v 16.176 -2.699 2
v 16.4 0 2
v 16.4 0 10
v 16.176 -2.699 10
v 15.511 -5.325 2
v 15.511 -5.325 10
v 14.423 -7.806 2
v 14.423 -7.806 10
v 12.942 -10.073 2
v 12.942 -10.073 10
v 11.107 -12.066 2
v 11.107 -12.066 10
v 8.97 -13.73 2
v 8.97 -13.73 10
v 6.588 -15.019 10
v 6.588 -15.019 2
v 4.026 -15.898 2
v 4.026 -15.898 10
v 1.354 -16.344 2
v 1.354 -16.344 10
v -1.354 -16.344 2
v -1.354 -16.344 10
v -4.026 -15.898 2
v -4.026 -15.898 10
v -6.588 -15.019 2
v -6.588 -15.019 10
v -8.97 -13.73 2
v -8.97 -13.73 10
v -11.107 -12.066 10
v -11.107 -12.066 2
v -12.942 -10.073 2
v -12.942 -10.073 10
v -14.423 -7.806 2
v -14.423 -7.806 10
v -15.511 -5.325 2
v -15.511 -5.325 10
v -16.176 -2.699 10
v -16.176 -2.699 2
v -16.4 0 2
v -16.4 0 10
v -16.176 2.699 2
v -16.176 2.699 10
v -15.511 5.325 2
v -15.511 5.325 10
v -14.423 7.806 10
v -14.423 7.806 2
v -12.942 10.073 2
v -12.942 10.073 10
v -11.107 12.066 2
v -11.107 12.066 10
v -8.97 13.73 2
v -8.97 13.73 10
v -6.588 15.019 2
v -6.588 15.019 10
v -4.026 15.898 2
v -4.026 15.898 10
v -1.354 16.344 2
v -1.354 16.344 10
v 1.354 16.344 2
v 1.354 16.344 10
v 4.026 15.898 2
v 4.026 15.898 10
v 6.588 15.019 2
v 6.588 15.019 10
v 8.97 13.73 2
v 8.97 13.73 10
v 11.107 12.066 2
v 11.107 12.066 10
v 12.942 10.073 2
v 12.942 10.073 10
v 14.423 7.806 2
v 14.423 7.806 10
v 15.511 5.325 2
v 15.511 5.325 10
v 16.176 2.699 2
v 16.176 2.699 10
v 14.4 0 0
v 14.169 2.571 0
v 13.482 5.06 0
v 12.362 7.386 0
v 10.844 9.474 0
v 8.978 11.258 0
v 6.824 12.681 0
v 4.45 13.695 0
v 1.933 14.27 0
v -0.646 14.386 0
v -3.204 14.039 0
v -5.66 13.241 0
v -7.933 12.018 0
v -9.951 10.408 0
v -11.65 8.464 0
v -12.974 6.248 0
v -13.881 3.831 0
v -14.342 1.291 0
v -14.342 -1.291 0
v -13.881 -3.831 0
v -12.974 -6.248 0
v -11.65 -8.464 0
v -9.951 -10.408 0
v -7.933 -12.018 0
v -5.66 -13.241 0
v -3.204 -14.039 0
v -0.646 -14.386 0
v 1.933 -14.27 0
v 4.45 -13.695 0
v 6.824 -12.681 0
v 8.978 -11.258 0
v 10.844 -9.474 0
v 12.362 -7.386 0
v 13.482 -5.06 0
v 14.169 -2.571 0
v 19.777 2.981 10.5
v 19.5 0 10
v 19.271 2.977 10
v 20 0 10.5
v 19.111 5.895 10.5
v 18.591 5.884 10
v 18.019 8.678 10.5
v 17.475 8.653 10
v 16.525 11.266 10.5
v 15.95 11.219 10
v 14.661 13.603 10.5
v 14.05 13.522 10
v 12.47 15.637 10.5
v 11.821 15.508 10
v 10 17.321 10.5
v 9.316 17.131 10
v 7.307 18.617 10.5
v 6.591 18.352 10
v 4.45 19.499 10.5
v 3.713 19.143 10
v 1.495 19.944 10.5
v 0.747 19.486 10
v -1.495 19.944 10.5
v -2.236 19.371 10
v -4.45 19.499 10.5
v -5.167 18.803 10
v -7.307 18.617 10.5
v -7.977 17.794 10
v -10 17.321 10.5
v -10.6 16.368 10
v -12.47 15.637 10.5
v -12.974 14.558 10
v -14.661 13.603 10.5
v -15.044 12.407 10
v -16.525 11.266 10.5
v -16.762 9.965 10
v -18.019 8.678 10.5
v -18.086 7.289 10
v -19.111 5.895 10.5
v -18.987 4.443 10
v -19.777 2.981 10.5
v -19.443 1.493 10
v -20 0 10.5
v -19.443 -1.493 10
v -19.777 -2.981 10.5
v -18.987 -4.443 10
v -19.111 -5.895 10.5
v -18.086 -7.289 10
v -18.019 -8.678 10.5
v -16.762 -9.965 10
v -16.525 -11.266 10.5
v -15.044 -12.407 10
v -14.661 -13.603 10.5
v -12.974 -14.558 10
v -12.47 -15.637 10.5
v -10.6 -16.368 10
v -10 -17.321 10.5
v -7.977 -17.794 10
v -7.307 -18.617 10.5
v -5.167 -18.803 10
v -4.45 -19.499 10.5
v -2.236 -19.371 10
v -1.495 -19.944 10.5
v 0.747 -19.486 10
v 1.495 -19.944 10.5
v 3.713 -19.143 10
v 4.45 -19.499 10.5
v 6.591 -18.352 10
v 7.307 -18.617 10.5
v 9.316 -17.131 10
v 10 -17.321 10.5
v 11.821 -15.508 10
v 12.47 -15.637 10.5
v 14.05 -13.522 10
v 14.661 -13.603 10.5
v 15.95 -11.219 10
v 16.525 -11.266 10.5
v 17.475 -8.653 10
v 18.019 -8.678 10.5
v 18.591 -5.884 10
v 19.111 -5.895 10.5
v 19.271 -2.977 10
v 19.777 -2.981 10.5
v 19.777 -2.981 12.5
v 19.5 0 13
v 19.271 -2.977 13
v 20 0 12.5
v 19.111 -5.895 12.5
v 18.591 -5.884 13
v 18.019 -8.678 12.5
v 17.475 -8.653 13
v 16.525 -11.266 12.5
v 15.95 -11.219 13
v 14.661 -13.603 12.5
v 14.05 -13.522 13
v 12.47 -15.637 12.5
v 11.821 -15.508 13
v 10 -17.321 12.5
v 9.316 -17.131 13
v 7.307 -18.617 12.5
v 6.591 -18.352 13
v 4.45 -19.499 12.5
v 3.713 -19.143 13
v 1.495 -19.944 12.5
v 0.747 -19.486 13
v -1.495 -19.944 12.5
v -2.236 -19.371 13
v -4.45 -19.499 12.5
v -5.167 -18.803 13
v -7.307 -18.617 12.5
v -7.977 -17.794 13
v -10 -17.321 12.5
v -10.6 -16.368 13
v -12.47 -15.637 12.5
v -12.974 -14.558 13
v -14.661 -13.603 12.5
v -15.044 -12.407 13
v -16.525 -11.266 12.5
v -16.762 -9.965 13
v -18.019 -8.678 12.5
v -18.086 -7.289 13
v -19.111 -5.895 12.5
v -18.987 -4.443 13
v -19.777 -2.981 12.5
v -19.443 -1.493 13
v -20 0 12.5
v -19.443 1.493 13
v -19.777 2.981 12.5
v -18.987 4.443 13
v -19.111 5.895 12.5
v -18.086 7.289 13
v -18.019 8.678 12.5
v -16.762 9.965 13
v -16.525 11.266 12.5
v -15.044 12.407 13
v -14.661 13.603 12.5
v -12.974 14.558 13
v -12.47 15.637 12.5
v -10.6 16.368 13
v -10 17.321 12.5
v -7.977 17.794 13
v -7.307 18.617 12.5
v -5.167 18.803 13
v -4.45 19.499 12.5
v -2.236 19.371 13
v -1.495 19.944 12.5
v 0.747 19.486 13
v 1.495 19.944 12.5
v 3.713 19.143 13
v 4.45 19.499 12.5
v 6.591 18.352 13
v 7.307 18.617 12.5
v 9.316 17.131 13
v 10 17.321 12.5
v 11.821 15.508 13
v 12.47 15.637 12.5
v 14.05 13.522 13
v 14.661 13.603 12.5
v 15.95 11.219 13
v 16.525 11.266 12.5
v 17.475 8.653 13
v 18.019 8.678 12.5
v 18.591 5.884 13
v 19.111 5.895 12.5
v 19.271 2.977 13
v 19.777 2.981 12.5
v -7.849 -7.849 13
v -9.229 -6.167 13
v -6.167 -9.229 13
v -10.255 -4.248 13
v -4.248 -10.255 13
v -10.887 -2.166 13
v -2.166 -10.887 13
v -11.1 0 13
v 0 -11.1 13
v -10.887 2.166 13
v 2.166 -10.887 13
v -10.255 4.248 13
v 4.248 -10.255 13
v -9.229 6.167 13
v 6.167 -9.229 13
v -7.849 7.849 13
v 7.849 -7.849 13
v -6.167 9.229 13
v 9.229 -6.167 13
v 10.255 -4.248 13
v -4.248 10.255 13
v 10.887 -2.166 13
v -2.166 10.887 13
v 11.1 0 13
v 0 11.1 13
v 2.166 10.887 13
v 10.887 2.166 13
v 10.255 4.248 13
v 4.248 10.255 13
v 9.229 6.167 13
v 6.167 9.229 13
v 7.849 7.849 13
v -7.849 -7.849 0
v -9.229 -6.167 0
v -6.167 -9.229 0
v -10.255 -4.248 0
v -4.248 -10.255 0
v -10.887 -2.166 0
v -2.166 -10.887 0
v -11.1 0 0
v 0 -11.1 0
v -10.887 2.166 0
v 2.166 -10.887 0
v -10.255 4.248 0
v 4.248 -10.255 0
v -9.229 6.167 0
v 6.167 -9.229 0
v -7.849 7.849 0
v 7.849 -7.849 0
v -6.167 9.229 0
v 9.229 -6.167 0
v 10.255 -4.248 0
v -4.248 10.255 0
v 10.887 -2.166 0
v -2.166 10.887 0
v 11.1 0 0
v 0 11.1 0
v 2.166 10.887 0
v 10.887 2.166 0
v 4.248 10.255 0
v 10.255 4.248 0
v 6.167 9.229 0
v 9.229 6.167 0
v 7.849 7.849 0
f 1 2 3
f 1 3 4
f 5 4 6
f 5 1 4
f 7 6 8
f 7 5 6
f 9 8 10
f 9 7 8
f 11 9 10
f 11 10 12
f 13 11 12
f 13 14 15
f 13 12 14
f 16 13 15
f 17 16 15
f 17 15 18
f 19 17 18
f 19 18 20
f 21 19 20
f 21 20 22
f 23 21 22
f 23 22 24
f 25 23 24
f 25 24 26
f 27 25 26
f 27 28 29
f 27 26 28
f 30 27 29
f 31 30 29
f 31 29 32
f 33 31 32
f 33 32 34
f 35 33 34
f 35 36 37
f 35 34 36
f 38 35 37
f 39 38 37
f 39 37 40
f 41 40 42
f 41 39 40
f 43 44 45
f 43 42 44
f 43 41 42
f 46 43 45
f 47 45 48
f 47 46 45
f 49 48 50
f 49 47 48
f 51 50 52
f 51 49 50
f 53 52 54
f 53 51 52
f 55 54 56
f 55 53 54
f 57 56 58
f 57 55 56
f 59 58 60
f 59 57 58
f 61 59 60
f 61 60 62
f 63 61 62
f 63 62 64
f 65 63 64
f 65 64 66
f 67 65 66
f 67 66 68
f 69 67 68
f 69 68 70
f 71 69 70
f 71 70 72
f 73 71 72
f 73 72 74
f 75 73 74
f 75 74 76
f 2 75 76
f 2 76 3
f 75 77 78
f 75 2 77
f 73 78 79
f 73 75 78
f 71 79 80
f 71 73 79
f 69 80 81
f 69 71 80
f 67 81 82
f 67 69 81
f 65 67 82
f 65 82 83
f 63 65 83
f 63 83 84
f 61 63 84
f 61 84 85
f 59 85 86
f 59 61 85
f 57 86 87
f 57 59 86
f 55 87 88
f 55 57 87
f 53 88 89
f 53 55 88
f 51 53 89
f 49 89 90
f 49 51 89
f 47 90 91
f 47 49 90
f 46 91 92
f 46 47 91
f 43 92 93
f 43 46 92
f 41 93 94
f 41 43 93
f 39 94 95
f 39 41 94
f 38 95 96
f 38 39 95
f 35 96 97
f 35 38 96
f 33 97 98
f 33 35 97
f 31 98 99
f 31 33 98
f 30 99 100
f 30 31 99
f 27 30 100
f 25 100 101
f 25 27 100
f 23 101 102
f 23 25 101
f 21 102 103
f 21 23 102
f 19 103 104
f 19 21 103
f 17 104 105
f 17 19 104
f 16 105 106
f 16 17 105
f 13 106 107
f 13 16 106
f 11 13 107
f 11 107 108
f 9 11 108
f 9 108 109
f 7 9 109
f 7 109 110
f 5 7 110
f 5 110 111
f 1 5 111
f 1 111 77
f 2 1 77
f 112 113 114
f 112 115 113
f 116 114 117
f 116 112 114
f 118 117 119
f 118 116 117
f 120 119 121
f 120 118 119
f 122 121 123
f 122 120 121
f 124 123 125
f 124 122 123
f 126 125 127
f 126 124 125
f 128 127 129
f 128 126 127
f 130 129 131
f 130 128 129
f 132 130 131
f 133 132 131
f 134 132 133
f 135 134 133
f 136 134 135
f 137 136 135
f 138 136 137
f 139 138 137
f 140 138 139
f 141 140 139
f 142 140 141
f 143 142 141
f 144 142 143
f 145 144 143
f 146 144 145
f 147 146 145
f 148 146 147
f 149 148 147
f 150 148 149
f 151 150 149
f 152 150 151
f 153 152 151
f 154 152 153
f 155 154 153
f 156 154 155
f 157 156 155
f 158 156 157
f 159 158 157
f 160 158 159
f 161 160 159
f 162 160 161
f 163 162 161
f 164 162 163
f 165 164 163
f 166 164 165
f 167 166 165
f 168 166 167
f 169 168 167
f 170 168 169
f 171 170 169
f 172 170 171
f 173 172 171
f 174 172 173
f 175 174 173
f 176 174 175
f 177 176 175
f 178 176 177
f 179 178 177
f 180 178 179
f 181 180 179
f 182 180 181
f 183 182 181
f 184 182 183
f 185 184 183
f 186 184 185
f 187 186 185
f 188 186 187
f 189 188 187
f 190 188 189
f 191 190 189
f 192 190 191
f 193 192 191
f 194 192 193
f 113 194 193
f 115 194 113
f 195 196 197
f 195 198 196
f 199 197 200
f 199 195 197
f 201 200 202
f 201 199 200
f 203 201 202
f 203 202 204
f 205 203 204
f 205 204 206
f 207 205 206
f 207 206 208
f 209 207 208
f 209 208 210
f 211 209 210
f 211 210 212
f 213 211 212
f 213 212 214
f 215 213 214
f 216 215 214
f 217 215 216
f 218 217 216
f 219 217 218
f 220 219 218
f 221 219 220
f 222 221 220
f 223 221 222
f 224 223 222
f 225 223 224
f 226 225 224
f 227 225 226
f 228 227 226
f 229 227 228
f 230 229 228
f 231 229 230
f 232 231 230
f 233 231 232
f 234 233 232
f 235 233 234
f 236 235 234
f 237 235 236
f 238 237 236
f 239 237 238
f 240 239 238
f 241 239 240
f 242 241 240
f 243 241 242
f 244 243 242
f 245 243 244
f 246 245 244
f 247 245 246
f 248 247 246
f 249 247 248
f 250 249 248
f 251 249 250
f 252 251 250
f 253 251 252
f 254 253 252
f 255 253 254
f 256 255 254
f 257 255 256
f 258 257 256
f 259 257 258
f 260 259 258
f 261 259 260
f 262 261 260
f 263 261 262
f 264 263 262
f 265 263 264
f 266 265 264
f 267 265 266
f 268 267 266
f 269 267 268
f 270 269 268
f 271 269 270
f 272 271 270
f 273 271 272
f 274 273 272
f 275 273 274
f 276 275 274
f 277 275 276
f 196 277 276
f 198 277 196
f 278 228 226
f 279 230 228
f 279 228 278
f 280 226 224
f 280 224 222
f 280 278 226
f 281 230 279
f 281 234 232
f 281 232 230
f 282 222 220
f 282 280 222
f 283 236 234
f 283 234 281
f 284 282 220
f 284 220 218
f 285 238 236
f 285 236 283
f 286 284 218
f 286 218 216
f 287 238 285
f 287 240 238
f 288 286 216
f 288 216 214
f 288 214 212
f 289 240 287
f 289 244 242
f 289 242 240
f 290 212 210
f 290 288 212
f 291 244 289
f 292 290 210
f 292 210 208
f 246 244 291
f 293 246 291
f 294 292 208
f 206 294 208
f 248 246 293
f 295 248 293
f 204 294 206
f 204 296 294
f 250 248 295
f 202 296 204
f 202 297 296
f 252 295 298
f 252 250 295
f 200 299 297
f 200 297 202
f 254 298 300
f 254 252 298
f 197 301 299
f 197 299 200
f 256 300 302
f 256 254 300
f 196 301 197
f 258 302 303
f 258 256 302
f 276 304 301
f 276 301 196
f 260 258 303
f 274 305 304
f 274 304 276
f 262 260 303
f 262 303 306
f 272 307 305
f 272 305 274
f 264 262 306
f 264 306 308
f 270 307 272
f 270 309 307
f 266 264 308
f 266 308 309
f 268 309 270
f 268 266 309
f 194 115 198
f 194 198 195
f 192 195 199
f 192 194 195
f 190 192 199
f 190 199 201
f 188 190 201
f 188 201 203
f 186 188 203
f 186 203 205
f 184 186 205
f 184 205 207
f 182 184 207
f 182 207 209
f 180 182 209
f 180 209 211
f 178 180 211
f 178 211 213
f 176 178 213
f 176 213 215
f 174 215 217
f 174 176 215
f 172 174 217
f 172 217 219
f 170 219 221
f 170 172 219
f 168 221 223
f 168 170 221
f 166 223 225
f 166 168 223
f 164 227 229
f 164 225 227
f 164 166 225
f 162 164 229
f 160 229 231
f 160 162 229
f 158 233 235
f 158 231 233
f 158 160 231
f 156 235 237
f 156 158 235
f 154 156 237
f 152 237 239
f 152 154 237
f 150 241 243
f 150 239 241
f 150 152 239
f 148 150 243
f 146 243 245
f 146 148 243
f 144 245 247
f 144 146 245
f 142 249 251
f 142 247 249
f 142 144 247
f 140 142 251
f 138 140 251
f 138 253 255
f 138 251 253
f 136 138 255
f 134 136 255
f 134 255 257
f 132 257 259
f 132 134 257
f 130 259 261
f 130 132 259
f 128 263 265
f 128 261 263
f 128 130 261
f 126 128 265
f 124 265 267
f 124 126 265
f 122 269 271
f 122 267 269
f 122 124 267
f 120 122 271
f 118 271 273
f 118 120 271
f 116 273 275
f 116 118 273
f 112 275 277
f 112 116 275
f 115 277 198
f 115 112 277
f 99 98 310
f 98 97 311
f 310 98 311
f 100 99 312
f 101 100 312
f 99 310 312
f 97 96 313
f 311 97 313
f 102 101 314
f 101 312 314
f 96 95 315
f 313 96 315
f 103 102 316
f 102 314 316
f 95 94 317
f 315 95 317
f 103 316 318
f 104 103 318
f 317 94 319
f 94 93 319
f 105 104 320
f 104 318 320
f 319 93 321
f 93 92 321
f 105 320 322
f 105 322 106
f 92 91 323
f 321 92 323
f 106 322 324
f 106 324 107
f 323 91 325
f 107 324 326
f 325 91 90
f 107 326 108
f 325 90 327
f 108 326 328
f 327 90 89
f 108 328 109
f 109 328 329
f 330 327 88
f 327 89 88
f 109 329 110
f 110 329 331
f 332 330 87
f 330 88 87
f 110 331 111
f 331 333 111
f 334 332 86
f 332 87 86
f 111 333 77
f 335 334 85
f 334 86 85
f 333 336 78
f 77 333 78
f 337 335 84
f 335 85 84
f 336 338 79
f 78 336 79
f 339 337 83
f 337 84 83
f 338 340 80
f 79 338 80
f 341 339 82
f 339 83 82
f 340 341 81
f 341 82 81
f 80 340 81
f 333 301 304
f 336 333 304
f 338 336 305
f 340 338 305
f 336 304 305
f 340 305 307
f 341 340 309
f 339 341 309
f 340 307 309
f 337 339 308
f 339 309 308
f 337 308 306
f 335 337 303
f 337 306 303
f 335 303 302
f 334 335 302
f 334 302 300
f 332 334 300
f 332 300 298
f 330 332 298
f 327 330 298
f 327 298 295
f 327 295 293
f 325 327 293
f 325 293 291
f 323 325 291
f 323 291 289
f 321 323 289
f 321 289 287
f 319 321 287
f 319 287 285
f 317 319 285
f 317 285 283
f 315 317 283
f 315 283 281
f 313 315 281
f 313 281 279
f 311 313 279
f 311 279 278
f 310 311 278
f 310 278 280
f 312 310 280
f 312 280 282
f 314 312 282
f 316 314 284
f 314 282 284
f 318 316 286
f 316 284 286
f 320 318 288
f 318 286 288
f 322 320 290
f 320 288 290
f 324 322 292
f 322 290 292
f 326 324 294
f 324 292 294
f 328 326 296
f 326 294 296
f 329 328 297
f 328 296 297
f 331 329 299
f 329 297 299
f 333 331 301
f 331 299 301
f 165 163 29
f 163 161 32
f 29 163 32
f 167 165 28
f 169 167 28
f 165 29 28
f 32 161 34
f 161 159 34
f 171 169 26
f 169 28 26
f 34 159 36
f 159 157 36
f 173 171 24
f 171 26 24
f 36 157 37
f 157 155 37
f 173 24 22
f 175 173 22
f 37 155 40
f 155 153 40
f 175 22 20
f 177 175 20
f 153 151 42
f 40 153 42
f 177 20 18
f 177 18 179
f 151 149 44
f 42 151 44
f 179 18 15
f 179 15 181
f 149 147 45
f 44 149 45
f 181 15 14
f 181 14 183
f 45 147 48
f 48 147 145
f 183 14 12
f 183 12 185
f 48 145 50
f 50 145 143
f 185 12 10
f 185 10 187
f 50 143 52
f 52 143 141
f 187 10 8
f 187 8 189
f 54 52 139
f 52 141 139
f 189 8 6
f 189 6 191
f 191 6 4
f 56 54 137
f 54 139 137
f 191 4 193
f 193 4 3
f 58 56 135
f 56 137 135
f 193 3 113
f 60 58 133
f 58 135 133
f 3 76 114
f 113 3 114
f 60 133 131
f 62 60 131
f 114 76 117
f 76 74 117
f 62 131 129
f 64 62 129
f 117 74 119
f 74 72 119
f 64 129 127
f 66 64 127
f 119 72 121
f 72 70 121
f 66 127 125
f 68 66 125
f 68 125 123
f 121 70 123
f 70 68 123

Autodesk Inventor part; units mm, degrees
ref_plane "YZ Plane" through (0, 0, 0) normal (1, 0, 0) x (0, 1, 0)
ref_plane "XZ Plane" through (0, 0, 0) normal (0, 1, 0) x (-1, 0, 0)
ref_plane "XY Plane" through (0, 0, 0) normal (0, 0, 1) x (1, 0, 0)
sketch "スケッチ1" plane through (0, 0, 0) normal (0, 0, 1) x (1, 0, 0)
  circle A0 centre (0, 0) radius 16.4
  dimension "d0" = 32.8
extrude "押し出し1" add sketch "スケッチ1" along normal blind 10
sketch "スケッチ2" plane through (0, 0, 10) normal (0, 0, 1) x (1, 0, 0)
  circle A0 centre (0, 0) radius 16.4 projected
  circle A1 centre (0, 0) radius 20
  dimension "d3" = 40
extrude "押し出し2" add sketch "スケッチ2" along normal blind 3 contours A0 | A1
chamfer "面取り1" distance 2 angle 45 1 edges at (-16.4, 0, 0)
chamfer "面取り2" distance 0.5 angle 45 2 edges at (-20, 0, 13) (-20, 0, 10)
sketch "スケッチ3" plane through (0, 0, 13) normal (0, 0, 1) x (1, 0, 0)
  circle A0 centre (0, 0) radius 19.5 projected
  circle A1 centre (0, 0) radius 11.1
  dimension "d12" = 22.2
extrude "押し出し3" cut sketch "スケッチ3" against normal through all contours A1
properties part number "Print_Parts_P" material "PC/ABS プラスチック"
